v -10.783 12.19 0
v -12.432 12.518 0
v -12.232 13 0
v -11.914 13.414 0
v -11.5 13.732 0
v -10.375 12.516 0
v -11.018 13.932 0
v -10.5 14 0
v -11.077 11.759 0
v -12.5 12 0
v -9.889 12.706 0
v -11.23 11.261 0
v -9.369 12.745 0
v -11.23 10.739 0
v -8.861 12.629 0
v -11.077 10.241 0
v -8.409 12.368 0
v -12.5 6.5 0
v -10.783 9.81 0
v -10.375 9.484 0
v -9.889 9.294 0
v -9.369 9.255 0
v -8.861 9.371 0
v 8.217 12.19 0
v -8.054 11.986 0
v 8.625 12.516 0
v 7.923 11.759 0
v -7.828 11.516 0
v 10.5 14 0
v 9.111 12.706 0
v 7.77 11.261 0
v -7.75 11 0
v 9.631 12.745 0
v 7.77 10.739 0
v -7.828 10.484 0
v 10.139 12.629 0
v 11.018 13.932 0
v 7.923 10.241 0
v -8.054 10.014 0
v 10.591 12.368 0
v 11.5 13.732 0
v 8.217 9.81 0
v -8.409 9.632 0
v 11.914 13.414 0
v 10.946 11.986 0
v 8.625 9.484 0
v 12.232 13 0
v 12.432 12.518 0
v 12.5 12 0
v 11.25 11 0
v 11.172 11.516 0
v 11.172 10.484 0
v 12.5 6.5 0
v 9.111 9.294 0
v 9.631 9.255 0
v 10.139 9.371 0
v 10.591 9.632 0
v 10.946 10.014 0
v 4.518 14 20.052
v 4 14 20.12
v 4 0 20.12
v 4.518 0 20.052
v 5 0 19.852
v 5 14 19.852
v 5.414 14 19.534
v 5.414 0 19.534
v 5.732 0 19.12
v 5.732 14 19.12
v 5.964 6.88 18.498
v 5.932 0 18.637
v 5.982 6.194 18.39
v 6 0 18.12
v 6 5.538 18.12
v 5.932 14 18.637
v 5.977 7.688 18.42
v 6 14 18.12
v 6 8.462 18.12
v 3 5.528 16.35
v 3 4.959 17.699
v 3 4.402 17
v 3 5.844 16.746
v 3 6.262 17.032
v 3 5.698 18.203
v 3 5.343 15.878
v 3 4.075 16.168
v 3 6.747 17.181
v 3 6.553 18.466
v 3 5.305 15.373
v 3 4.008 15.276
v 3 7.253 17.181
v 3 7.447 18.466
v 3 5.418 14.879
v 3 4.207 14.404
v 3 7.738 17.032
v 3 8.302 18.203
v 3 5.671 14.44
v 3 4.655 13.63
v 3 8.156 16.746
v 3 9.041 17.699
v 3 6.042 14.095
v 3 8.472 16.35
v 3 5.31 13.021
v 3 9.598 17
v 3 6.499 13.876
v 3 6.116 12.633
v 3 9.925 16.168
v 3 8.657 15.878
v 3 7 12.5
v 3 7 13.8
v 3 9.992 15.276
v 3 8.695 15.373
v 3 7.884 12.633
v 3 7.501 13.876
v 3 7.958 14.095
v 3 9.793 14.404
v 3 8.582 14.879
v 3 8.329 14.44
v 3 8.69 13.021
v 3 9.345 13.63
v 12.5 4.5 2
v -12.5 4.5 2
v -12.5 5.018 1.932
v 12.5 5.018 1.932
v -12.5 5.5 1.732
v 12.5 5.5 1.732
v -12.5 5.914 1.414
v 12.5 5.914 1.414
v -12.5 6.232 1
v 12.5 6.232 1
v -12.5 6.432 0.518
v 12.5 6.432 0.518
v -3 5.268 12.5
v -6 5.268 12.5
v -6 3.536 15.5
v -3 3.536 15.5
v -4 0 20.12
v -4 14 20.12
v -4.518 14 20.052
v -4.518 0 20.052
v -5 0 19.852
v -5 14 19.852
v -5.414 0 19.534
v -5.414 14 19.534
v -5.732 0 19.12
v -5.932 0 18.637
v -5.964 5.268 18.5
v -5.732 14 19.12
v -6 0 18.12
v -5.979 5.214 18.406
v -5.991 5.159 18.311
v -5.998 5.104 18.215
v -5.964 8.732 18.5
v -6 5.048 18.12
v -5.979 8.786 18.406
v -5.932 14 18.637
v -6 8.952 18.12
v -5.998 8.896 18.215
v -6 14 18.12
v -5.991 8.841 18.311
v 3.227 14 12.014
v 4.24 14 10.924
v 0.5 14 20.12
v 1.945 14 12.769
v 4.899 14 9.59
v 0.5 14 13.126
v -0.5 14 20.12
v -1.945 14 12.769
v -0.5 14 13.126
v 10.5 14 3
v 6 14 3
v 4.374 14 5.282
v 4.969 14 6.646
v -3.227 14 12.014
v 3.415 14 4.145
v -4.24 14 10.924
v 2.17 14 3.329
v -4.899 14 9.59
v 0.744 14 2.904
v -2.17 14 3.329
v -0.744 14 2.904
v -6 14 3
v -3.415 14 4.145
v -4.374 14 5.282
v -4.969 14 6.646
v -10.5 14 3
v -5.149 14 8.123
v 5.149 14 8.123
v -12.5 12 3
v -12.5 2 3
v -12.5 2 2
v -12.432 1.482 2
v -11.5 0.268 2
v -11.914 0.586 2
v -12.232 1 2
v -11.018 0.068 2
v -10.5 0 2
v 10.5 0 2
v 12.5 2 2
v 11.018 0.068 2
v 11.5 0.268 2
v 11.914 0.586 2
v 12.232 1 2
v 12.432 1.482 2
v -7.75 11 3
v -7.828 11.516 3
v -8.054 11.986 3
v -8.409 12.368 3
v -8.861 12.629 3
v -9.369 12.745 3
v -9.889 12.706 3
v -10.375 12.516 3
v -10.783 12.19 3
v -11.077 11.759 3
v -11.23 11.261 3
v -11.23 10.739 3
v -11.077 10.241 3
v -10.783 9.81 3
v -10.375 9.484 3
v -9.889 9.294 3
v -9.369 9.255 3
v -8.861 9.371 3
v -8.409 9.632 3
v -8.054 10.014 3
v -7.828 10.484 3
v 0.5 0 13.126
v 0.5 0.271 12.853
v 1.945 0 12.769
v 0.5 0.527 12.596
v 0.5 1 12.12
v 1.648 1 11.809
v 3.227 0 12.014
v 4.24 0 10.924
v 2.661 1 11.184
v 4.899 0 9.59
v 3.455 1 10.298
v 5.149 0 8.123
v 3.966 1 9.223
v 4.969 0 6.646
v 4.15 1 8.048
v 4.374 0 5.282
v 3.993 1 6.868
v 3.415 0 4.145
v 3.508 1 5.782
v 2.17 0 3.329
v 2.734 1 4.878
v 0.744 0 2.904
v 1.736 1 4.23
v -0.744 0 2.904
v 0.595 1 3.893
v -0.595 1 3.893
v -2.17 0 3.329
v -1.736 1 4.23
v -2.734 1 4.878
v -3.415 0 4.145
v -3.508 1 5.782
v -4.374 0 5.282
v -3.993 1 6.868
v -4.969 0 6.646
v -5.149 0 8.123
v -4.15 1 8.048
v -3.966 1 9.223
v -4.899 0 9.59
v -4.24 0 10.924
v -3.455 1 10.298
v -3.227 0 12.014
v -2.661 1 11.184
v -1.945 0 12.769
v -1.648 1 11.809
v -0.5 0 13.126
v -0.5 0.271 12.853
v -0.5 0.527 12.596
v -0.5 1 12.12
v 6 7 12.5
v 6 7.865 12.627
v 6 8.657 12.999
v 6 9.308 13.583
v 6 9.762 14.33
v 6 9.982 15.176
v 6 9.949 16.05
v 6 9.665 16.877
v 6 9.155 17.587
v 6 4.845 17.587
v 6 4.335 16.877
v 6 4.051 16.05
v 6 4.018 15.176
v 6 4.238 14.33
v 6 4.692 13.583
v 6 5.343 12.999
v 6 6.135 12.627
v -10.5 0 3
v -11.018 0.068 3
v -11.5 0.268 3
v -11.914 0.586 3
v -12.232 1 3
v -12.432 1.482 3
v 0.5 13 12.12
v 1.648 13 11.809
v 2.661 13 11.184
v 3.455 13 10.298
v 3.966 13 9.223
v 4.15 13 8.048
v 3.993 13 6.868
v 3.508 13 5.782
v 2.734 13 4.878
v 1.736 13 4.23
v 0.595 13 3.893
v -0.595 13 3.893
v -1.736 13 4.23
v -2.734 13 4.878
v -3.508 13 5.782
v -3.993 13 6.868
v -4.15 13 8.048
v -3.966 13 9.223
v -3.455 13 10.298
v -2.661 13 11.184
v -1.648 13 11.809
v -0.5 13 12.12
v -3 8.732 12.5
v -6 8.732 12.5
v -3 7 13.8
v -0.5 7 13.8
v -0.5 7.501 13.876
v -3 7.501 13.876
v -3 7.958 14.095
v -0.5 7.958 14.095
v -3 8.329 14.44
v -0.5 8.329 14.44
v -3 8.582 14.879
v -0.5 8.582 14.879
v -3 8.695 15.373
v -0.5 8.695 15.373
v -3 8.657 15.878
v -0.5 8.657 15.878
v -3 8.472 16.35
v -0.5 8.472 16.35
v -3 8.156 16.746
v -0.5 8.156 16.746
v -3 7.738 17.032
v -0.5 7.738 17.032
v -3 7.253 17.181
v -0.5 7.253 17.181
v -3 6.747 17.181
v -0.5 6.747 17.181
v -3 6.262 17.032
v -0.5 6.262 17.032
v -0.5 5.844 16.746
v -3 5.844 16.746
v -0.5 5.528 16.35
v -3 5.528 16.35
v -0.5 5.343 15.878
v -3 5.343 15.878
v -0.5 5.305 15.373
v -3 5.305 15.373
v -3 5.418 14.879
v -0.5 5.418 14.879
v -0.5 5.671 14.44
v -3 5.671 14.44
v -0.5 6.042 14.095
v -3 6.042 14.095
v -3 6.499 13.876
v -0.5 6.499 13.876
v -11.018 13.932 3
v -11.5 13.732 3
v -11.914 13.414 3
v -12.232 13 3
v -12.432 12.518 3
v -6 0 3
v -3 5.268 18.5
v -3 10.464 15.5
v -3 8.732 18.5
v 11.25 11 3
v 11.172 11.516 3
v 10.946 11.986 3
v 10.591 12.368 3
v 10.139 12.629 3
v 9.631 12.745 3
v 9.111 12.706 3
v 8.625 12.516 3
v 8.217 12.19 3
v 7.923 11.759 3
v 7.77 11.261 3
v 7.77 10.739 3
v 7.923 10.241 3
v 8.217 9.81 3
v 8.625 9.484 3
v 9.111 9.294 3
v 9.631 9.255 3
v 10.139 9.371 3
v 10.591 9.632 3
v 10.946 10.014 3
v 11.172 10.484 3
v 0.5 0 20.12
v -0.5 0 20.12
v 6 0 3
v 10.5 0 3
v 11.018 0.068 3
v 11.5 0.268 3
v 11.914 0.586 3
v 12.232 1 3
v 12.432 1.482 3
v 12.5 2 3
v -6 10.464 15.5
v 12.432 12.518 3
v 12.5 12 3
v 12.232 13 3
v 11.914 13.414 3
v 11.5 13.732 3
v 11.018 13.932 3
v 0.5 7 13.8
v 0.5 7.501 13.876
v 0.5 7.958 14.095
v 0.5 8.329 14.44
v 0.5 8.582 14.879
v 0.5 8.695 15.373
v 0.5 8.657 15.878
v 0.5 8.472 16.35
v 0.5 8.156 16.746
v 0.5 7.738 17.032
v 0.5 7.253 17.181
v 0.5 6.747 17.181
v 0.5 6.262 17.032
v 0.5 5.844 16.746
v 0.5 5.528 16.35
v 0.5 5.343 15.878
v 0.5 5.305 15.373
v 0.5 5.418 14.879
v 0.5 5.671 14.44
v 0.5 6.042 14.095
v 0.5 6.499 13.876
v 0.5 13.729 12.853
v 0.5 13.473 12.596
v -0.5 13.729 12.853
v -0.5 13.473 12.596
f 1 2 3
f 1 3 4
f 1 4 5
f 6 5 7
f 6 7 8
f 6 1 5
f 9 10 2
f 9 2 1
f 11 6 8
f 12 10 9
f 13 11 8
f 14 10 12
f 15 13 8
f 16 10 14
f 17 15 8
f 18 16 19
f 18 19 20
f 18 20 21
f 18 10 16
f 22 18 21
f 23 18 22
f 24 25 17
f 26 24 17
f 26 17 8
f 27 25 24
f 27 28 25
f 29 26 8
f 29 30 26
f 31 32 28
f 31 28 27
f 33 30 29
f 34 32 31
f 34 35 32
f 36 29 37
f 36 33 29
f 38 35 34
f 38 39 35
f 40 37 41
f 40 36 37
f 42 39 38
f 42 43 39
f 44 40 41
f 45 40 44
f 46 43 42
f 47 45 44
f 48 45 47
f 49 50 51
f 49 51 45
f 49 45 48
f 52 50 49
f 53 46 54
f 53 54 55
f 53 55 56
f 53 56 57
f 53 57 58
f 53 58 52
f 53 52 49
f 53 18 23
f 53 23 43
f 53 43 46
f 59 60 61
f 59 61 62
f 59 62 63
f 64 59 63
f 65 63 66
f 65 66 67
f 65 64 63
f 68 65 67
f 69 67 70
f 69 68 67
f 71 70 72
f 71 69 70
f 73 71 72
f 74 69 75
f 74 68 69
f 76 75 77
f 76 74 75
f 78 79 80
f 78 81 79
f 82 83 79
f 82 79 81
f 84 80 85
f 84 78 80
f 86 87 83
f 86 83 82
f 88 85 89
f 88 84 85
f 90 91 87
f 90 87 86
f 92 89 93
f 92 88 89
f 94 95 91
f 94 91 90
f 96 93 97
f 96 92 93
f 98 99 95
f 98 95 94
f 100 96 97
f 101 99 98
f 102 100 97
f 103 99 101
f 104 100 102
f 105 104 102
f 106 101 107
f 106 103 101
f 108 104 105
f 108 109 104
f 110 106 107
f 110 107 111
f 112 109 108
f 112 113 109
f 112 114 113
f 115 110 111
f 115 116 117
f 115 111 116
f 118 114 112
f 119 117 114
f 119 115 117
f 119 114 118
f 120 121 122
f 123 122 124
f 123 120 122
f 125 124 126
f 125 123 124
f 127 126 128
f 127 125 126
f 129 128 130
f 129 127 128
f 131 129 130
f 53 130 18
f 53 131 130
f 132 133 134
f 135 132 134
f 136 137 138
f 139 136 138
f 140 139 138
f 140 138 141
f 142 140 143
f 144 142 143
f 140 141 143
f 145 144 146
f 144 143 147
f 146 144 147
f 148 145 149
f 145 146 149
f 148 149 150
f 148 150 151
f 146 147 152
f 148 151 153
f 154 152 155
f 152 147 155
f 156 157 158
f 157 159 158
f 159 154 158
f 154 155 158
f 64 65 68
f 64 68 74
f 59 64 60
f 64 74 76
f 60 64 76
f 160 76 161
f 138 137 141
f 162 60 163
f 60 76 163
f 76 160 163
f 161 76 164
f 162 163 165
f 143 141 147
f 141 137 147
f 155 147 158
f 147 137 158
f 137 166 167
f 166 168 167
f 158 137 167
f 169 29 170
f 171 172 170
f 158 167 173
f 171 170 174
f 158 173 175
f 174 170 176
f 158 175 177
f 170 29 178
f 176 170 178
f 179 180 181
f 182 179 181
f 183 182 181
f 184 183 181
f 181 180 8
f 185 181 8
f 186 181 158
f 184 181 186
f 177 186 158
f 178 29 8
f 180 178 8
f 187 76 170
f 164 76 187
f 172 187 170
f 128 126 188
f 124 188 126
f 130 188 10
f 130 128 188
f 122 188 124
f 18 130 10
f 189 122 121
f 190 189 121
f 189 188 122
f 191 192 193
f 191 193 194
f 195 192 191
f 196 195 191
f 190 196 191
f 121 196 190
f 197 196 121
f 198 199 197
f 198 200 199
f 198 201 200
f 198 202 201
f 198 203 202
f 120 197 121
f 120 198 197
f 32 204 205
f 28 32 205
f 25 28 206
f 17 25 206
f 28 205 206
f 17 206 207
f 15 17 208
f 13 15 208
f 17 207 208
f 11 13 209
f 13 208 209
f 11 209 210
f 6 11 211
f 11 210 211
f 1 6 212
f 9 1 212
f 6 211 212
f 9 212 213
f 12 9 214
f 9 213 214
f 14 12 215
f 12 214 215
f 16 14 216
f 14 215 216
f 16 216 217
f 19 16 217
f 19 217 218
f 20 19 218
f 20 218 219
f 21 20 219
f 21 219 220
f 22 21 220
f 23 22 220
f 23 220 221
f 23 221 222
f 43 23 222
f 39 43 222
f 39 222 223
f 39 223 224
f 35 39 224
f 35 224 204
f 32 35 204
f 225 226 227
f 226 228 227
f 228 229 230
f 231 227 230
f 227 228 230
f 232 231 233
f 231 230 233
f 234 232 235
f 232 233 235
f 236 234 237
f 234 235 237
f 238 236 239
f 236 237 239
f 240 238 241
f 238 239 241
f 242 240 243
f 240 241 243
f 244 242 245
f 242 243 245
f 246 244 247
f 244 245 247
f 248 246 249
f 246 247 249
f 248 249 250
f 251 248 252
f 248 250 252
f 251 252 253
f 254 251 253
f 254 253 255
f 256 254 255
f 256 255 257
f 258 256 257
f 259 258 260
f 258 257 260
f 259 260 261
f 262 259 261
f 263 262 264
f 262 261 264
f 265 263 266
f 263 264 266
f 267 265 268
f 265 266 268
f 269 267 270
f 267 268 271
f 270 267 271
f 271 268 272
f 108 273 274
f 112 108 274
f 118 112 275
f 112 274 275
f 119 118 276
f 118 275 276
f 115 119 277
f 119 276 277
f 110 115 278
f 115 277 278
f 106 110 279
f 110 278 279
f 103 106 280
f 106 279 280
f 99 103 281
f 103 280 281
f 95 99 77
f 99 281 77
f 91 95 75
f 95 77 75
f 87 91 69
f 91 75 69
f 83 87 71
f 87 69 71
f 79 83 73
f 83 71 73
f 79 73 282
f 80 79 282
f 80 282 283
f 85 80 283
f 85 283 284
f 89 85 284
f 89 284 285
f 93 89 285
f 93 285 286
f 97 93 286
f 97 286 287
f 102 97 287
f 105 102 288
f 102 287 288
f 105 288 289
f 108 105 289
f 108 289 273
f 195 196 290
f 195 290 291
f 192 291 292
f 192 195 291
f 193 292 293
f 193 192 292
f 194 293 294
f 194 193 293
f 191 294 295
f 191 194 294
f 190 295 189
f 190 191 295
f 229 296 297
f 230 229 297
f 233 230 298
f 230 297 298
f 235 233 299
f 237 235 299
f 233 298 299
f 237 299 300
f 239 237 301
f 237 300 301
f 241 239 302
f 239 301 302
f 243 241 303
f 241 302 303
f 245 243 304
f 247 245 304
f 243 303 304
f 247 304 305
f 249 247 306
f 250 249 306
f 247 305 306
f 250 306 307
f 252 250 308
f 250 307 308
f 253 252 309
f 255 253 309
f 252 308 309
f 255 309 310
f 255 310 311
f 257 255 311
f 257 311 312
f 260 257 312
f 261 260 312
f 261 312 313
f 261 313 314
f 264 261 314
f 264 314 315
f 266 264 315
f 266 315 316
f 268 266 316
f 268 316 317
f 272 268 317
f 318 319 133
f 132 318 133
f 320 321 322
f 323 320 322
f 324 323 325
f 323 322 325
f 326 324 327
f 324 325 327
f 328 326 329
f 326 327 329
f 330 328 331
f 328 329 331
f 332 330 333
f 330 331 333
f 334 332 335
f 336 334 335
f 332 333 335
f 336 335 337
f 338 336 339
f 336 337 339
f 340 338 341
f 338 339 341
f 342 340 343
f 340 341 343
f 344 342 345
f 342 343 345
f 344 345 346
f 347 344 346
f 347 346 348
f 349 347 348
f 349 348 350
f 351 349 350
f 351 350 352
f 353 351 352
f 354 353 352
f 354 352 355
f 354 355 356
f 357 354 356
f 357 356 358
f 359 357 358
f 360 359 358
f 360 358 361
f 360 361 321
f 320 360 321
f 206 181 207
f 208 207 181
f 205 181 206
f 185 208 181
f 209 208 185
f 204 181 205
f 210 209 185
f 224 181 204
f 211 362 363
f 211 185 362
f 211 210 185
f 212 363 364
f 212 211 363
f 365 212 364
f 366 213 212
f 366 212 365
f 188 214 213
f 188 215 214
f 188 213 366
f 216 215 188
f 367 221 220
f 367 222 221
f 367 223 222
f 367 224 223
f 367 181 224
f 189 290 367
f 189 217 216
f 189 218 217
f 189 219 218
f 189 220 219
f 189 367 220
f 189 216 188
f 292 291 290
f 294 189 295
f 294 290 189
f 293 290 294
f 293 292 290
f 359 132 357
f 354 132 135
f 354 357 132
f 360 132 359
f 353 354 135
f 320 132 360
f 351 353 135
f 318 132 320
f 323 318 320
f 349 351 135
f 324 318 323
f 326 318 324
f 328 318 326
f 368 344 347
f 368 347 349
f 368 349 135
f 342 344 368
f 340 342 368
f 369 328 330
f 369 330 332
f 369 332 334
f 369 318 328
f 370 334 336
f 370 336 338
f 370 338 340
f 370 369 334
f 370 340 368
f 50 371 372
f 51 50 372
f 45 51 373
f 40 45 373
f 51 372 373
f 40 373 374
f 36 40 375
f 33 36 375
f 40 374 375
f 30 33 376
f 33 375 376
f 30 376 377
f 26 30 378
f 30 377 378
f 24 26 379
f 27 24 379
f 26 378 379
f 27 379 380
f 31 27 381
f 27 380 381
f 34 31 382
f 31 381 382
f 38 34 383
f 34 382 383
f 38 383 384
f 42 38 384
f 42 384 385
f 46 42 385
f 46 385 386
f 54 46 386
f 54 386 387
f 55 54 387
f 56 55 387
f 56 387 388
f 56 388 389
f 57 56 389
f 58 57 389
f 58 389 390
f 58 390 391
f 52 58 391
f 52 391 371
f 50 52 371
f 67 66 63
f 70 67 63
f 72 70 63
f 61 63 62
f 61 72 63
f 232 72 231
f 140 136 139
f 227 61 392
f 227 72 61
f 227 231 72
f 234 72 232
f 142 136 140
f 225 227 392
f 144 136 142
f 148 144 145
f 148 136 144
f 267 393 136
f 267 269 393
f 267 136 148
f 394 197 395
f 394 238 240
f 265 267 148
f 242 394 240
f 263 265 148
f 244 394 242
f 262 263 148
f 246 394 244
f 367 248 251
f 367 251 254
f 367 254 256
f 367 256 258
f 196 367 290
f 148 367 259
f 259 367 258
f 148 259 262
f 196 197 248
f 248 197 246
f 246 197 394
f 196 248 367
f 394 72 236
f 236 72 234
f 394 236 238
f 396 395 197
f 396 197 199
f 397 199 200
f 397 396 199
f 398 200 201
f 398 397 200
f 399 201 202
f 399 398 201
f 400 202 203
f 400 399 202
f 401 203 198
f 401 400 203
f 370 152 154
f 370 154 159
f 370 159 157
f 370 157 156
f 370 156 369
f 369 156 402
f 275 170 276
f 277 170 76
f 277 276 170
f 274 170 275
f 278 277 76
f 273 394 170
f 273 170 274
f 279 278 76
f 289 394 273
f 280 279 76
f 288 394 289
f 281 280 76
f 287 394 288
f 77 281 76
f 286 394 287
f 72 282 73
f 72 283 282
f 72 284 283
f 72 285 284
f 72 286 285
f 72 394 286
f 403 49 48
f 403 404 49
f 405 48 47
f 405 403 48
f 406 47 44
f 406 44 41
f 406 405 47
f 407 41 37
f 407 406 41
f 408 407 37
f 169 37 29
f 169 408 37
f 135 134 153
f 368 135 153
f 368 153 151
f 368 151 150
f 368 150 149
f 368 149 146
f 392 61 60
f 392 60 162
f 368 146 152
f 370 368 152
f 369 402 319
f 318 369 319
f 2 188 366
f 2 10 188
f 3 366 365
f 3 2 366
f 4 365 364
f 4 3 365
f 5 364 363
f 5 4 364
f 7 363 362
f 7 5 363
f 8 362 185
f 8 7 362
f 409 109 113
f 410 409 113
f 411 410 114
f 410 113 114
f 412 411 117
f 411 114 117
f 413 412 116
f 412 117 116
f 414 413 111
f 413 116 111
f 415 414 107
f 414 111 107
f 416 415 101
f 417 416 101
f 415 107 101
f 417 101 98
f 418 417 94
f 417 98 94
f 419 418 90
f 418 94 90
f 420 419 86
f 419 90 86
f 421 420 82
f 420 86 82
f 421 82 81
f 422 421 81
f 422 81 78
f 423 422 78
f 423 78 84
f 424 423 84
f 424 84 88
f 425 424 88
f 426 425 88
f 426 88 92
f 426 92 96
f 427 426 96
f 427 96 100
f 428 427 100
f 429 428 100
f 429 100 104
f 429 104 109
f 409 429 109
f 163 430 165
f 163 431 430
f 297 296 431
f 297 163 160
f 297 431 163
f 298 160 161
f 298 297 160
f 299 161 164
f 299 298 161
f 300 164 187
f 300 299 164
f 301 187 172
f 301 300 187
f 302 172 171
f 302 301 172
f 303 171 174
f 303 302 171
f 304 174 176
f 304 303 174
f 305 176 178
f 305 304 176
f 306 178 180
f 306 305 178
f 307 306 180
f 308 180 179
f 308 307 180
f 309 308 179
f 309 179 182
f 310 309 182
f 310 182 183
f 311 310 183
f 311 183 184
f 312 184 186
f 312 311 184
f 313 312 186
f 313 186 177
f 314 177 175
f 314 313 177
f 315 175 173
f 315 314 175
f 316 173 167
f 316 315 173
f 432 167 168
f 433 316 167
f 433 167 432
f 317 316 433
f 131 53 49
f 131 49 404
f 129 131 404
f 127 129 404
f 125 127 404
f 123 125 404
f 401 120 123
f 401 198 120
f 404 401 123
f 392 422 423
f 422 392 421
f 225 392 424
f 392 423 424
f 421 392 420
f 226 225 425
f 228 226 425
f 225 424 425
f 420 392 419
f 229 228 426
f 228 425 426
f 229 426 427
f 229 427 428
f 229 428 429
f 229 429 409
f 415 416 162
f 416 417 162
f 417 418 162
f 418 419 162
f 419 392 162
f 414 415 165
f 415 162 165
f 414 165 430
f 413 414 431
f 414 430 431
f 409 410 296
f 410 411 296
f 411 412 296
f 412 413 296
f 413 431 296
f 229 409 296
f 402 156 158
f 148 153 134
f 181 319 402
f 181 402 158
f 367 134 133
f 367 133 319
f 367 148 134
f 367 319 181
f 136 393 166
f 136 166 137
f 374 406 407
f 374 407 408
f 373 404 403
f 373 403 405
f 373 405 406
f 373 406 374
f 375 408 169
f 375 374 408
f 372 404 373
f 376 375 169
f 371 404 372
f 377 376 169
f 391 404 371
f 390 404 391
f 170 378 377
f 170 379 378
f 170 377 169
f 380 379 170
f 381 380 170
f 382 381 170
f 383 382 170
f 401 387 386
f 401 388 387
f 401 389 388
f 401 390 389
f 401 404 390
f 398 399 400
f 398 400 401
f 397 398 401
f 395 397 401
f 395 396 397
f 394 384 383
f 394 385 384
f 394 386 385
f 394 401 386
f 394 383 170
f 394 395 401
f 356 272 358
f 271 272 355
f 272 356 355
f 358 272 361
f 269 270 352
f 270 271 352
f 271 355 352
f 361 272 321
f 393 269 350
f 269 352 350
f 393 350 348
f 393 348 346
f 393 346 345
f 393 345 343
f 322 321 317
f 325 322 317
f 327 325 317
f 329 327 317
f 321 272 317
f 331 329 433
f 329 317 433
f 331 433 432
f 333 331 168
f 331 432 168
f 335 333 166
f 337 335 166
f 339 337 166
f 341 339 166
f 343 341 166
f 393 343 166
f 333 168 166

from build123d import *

# Parameters (mm, degrees)
BOSS_EXTRUDE1_DEPTH = 14
CUT_EXTRUDE1_DEPTH  = 28.51465704
CHAMFER1_SIZE       = 1
FILLET1_R           = 2
SKETCH3_R           = 1.75
CUT_EXTRUDE2_DEPTH  = 26.403494878
SKETCH4_R           = 1.7
CUT_EXTRUDE3_DEPTH  = 36.01151742
SKETCH5_R           = 3
CUT_EXTRUDE4_DEPTH  = 3
CUT_EXTRUDE5_DEPTH  = 3


with BuildPart() as part:
    # Sketch1 → Boss-Extrude1 (new body)
    with BuildSketch(Plane(origin=(0, 0, 0), x_dir=(1, 0, 0), z_dir=(0, 1, 0))):
        Polygon((-12.5, 0), (12.5, 0), (12.5, -3), (6, -3), (6, -20.1198), (-6, -20.1198), (-6, -3), (-12.5, -3), align=None)
    extrude(amount=BOSS_EXTRUDE1_DEPTH)

    # Sketch2 → Cut-Extrude1 (cut, through all)
    with BuildSketch(Plane(origin=(0, 14, 0), x_dir=(1, 0, 0), z_dir=(0, 1, 0))):
        with BuildLine():
            Line((-0.5, -12.119769411), (-0.5, -20.1198))
            Line((-0.5, -20.1198), (0.5, -20.1198))
            Line((0.5, -20.1198), (0.5, -12.119769411))
            ThreePointArc((0.5, -12.119769411), (0, -3.85), (-0.5, -12.119769411))
        make_face()
    extrude(amount=-CUT_EXTRUDE1_DEPTH, mode=Mode.SUBTRACT)

    # Chamfer1
    chamfer1_edges = [part.edges().sort_by_distance(p)[0] for p in [
        (0, 0, 3.85),
        (0, 14, 3.85),
    ]]
    chamfer(chamfer1_edges, length=CHAMFER1_SIZE)

    # Fillet1
    fillet1_edges = [part.edges().sort_by_distance(p)[0] for p in [
        (-12.5, 0, 1.5),
        (6, 7, 20.1198),
        (-6, 7, 20.1198),
        (12.5, 14, 1.5),
        (-12.5, 14, 1.5),
        (12.5, 0, 1.5),
    ]]
    fillet(fillet1_edges, radius=FILLET1_R)

    # Sketch3 → Cut-Extrude2 (cut, through all)
    with BuildSketch(Plane.XY.offset(3)):
        with Locations((-9.5, 11)):
            Circle(SKETCH3_R)
        with Locations((9.5, 11)):
            Circle(SKETCH3_R)
    extrude(amount=-CUT_EXTRUDE2_DEPTH, mode=Mode.SUBTRACT)

    # Sketch4 → Cut-Extrude3 (cut, through all)
    with BuildSketch(Plane(origin=(12.5, 0, 0), x_dir=(0, 0, -1), z_dir=(1, 0, 0))):
        with Locations((-15.5, 7)):
            Circle(SKETCH4_R)
        with BuildLine():
            Line((-2, 0), (-2, 4.5))
            ThreePointArc((-2, 4.5), (-1.414213562, 5.914213562), (0, 6.5))
            Line((0, 6.5), (0, 0))
            Line((0, 0), (-2, 0))
        make_face()
    extrude(amount=-CUT_EXTRUDE3_DEPTH, mode=Mode.SUBTRACT)

    # Sketch5 → Cut-Extrude4 (cut)
    with BuildSketch(Plane(origin=(6, 0, 0), x_dir=(0, 0, -1), z_dir=(1, 0, 0))):
        with Locations((-15.5, 7)):
            Circle(SKETCH5_R)
    extrude(amount=-CUT_EXTRUDE4_DEPTH, mode=Mode.SUBTRACT)

    # Sketch6 → Cut-Extrude5 (cut)
    with BuildSketch(Plane.ZY.offset(6)):
        Polygon((15.5, 3.535898385), (18.5, 5.267949192), (18.5, 8.732050808), (15.5, 10.464101615), (12.5, 8.732050808), (12.5, 5.267949192), align=None)
    extrude(amount=-CUT_EXTRUDE5_DEPTH, mode=Mode.SUBTRACT)


solid = part.part
